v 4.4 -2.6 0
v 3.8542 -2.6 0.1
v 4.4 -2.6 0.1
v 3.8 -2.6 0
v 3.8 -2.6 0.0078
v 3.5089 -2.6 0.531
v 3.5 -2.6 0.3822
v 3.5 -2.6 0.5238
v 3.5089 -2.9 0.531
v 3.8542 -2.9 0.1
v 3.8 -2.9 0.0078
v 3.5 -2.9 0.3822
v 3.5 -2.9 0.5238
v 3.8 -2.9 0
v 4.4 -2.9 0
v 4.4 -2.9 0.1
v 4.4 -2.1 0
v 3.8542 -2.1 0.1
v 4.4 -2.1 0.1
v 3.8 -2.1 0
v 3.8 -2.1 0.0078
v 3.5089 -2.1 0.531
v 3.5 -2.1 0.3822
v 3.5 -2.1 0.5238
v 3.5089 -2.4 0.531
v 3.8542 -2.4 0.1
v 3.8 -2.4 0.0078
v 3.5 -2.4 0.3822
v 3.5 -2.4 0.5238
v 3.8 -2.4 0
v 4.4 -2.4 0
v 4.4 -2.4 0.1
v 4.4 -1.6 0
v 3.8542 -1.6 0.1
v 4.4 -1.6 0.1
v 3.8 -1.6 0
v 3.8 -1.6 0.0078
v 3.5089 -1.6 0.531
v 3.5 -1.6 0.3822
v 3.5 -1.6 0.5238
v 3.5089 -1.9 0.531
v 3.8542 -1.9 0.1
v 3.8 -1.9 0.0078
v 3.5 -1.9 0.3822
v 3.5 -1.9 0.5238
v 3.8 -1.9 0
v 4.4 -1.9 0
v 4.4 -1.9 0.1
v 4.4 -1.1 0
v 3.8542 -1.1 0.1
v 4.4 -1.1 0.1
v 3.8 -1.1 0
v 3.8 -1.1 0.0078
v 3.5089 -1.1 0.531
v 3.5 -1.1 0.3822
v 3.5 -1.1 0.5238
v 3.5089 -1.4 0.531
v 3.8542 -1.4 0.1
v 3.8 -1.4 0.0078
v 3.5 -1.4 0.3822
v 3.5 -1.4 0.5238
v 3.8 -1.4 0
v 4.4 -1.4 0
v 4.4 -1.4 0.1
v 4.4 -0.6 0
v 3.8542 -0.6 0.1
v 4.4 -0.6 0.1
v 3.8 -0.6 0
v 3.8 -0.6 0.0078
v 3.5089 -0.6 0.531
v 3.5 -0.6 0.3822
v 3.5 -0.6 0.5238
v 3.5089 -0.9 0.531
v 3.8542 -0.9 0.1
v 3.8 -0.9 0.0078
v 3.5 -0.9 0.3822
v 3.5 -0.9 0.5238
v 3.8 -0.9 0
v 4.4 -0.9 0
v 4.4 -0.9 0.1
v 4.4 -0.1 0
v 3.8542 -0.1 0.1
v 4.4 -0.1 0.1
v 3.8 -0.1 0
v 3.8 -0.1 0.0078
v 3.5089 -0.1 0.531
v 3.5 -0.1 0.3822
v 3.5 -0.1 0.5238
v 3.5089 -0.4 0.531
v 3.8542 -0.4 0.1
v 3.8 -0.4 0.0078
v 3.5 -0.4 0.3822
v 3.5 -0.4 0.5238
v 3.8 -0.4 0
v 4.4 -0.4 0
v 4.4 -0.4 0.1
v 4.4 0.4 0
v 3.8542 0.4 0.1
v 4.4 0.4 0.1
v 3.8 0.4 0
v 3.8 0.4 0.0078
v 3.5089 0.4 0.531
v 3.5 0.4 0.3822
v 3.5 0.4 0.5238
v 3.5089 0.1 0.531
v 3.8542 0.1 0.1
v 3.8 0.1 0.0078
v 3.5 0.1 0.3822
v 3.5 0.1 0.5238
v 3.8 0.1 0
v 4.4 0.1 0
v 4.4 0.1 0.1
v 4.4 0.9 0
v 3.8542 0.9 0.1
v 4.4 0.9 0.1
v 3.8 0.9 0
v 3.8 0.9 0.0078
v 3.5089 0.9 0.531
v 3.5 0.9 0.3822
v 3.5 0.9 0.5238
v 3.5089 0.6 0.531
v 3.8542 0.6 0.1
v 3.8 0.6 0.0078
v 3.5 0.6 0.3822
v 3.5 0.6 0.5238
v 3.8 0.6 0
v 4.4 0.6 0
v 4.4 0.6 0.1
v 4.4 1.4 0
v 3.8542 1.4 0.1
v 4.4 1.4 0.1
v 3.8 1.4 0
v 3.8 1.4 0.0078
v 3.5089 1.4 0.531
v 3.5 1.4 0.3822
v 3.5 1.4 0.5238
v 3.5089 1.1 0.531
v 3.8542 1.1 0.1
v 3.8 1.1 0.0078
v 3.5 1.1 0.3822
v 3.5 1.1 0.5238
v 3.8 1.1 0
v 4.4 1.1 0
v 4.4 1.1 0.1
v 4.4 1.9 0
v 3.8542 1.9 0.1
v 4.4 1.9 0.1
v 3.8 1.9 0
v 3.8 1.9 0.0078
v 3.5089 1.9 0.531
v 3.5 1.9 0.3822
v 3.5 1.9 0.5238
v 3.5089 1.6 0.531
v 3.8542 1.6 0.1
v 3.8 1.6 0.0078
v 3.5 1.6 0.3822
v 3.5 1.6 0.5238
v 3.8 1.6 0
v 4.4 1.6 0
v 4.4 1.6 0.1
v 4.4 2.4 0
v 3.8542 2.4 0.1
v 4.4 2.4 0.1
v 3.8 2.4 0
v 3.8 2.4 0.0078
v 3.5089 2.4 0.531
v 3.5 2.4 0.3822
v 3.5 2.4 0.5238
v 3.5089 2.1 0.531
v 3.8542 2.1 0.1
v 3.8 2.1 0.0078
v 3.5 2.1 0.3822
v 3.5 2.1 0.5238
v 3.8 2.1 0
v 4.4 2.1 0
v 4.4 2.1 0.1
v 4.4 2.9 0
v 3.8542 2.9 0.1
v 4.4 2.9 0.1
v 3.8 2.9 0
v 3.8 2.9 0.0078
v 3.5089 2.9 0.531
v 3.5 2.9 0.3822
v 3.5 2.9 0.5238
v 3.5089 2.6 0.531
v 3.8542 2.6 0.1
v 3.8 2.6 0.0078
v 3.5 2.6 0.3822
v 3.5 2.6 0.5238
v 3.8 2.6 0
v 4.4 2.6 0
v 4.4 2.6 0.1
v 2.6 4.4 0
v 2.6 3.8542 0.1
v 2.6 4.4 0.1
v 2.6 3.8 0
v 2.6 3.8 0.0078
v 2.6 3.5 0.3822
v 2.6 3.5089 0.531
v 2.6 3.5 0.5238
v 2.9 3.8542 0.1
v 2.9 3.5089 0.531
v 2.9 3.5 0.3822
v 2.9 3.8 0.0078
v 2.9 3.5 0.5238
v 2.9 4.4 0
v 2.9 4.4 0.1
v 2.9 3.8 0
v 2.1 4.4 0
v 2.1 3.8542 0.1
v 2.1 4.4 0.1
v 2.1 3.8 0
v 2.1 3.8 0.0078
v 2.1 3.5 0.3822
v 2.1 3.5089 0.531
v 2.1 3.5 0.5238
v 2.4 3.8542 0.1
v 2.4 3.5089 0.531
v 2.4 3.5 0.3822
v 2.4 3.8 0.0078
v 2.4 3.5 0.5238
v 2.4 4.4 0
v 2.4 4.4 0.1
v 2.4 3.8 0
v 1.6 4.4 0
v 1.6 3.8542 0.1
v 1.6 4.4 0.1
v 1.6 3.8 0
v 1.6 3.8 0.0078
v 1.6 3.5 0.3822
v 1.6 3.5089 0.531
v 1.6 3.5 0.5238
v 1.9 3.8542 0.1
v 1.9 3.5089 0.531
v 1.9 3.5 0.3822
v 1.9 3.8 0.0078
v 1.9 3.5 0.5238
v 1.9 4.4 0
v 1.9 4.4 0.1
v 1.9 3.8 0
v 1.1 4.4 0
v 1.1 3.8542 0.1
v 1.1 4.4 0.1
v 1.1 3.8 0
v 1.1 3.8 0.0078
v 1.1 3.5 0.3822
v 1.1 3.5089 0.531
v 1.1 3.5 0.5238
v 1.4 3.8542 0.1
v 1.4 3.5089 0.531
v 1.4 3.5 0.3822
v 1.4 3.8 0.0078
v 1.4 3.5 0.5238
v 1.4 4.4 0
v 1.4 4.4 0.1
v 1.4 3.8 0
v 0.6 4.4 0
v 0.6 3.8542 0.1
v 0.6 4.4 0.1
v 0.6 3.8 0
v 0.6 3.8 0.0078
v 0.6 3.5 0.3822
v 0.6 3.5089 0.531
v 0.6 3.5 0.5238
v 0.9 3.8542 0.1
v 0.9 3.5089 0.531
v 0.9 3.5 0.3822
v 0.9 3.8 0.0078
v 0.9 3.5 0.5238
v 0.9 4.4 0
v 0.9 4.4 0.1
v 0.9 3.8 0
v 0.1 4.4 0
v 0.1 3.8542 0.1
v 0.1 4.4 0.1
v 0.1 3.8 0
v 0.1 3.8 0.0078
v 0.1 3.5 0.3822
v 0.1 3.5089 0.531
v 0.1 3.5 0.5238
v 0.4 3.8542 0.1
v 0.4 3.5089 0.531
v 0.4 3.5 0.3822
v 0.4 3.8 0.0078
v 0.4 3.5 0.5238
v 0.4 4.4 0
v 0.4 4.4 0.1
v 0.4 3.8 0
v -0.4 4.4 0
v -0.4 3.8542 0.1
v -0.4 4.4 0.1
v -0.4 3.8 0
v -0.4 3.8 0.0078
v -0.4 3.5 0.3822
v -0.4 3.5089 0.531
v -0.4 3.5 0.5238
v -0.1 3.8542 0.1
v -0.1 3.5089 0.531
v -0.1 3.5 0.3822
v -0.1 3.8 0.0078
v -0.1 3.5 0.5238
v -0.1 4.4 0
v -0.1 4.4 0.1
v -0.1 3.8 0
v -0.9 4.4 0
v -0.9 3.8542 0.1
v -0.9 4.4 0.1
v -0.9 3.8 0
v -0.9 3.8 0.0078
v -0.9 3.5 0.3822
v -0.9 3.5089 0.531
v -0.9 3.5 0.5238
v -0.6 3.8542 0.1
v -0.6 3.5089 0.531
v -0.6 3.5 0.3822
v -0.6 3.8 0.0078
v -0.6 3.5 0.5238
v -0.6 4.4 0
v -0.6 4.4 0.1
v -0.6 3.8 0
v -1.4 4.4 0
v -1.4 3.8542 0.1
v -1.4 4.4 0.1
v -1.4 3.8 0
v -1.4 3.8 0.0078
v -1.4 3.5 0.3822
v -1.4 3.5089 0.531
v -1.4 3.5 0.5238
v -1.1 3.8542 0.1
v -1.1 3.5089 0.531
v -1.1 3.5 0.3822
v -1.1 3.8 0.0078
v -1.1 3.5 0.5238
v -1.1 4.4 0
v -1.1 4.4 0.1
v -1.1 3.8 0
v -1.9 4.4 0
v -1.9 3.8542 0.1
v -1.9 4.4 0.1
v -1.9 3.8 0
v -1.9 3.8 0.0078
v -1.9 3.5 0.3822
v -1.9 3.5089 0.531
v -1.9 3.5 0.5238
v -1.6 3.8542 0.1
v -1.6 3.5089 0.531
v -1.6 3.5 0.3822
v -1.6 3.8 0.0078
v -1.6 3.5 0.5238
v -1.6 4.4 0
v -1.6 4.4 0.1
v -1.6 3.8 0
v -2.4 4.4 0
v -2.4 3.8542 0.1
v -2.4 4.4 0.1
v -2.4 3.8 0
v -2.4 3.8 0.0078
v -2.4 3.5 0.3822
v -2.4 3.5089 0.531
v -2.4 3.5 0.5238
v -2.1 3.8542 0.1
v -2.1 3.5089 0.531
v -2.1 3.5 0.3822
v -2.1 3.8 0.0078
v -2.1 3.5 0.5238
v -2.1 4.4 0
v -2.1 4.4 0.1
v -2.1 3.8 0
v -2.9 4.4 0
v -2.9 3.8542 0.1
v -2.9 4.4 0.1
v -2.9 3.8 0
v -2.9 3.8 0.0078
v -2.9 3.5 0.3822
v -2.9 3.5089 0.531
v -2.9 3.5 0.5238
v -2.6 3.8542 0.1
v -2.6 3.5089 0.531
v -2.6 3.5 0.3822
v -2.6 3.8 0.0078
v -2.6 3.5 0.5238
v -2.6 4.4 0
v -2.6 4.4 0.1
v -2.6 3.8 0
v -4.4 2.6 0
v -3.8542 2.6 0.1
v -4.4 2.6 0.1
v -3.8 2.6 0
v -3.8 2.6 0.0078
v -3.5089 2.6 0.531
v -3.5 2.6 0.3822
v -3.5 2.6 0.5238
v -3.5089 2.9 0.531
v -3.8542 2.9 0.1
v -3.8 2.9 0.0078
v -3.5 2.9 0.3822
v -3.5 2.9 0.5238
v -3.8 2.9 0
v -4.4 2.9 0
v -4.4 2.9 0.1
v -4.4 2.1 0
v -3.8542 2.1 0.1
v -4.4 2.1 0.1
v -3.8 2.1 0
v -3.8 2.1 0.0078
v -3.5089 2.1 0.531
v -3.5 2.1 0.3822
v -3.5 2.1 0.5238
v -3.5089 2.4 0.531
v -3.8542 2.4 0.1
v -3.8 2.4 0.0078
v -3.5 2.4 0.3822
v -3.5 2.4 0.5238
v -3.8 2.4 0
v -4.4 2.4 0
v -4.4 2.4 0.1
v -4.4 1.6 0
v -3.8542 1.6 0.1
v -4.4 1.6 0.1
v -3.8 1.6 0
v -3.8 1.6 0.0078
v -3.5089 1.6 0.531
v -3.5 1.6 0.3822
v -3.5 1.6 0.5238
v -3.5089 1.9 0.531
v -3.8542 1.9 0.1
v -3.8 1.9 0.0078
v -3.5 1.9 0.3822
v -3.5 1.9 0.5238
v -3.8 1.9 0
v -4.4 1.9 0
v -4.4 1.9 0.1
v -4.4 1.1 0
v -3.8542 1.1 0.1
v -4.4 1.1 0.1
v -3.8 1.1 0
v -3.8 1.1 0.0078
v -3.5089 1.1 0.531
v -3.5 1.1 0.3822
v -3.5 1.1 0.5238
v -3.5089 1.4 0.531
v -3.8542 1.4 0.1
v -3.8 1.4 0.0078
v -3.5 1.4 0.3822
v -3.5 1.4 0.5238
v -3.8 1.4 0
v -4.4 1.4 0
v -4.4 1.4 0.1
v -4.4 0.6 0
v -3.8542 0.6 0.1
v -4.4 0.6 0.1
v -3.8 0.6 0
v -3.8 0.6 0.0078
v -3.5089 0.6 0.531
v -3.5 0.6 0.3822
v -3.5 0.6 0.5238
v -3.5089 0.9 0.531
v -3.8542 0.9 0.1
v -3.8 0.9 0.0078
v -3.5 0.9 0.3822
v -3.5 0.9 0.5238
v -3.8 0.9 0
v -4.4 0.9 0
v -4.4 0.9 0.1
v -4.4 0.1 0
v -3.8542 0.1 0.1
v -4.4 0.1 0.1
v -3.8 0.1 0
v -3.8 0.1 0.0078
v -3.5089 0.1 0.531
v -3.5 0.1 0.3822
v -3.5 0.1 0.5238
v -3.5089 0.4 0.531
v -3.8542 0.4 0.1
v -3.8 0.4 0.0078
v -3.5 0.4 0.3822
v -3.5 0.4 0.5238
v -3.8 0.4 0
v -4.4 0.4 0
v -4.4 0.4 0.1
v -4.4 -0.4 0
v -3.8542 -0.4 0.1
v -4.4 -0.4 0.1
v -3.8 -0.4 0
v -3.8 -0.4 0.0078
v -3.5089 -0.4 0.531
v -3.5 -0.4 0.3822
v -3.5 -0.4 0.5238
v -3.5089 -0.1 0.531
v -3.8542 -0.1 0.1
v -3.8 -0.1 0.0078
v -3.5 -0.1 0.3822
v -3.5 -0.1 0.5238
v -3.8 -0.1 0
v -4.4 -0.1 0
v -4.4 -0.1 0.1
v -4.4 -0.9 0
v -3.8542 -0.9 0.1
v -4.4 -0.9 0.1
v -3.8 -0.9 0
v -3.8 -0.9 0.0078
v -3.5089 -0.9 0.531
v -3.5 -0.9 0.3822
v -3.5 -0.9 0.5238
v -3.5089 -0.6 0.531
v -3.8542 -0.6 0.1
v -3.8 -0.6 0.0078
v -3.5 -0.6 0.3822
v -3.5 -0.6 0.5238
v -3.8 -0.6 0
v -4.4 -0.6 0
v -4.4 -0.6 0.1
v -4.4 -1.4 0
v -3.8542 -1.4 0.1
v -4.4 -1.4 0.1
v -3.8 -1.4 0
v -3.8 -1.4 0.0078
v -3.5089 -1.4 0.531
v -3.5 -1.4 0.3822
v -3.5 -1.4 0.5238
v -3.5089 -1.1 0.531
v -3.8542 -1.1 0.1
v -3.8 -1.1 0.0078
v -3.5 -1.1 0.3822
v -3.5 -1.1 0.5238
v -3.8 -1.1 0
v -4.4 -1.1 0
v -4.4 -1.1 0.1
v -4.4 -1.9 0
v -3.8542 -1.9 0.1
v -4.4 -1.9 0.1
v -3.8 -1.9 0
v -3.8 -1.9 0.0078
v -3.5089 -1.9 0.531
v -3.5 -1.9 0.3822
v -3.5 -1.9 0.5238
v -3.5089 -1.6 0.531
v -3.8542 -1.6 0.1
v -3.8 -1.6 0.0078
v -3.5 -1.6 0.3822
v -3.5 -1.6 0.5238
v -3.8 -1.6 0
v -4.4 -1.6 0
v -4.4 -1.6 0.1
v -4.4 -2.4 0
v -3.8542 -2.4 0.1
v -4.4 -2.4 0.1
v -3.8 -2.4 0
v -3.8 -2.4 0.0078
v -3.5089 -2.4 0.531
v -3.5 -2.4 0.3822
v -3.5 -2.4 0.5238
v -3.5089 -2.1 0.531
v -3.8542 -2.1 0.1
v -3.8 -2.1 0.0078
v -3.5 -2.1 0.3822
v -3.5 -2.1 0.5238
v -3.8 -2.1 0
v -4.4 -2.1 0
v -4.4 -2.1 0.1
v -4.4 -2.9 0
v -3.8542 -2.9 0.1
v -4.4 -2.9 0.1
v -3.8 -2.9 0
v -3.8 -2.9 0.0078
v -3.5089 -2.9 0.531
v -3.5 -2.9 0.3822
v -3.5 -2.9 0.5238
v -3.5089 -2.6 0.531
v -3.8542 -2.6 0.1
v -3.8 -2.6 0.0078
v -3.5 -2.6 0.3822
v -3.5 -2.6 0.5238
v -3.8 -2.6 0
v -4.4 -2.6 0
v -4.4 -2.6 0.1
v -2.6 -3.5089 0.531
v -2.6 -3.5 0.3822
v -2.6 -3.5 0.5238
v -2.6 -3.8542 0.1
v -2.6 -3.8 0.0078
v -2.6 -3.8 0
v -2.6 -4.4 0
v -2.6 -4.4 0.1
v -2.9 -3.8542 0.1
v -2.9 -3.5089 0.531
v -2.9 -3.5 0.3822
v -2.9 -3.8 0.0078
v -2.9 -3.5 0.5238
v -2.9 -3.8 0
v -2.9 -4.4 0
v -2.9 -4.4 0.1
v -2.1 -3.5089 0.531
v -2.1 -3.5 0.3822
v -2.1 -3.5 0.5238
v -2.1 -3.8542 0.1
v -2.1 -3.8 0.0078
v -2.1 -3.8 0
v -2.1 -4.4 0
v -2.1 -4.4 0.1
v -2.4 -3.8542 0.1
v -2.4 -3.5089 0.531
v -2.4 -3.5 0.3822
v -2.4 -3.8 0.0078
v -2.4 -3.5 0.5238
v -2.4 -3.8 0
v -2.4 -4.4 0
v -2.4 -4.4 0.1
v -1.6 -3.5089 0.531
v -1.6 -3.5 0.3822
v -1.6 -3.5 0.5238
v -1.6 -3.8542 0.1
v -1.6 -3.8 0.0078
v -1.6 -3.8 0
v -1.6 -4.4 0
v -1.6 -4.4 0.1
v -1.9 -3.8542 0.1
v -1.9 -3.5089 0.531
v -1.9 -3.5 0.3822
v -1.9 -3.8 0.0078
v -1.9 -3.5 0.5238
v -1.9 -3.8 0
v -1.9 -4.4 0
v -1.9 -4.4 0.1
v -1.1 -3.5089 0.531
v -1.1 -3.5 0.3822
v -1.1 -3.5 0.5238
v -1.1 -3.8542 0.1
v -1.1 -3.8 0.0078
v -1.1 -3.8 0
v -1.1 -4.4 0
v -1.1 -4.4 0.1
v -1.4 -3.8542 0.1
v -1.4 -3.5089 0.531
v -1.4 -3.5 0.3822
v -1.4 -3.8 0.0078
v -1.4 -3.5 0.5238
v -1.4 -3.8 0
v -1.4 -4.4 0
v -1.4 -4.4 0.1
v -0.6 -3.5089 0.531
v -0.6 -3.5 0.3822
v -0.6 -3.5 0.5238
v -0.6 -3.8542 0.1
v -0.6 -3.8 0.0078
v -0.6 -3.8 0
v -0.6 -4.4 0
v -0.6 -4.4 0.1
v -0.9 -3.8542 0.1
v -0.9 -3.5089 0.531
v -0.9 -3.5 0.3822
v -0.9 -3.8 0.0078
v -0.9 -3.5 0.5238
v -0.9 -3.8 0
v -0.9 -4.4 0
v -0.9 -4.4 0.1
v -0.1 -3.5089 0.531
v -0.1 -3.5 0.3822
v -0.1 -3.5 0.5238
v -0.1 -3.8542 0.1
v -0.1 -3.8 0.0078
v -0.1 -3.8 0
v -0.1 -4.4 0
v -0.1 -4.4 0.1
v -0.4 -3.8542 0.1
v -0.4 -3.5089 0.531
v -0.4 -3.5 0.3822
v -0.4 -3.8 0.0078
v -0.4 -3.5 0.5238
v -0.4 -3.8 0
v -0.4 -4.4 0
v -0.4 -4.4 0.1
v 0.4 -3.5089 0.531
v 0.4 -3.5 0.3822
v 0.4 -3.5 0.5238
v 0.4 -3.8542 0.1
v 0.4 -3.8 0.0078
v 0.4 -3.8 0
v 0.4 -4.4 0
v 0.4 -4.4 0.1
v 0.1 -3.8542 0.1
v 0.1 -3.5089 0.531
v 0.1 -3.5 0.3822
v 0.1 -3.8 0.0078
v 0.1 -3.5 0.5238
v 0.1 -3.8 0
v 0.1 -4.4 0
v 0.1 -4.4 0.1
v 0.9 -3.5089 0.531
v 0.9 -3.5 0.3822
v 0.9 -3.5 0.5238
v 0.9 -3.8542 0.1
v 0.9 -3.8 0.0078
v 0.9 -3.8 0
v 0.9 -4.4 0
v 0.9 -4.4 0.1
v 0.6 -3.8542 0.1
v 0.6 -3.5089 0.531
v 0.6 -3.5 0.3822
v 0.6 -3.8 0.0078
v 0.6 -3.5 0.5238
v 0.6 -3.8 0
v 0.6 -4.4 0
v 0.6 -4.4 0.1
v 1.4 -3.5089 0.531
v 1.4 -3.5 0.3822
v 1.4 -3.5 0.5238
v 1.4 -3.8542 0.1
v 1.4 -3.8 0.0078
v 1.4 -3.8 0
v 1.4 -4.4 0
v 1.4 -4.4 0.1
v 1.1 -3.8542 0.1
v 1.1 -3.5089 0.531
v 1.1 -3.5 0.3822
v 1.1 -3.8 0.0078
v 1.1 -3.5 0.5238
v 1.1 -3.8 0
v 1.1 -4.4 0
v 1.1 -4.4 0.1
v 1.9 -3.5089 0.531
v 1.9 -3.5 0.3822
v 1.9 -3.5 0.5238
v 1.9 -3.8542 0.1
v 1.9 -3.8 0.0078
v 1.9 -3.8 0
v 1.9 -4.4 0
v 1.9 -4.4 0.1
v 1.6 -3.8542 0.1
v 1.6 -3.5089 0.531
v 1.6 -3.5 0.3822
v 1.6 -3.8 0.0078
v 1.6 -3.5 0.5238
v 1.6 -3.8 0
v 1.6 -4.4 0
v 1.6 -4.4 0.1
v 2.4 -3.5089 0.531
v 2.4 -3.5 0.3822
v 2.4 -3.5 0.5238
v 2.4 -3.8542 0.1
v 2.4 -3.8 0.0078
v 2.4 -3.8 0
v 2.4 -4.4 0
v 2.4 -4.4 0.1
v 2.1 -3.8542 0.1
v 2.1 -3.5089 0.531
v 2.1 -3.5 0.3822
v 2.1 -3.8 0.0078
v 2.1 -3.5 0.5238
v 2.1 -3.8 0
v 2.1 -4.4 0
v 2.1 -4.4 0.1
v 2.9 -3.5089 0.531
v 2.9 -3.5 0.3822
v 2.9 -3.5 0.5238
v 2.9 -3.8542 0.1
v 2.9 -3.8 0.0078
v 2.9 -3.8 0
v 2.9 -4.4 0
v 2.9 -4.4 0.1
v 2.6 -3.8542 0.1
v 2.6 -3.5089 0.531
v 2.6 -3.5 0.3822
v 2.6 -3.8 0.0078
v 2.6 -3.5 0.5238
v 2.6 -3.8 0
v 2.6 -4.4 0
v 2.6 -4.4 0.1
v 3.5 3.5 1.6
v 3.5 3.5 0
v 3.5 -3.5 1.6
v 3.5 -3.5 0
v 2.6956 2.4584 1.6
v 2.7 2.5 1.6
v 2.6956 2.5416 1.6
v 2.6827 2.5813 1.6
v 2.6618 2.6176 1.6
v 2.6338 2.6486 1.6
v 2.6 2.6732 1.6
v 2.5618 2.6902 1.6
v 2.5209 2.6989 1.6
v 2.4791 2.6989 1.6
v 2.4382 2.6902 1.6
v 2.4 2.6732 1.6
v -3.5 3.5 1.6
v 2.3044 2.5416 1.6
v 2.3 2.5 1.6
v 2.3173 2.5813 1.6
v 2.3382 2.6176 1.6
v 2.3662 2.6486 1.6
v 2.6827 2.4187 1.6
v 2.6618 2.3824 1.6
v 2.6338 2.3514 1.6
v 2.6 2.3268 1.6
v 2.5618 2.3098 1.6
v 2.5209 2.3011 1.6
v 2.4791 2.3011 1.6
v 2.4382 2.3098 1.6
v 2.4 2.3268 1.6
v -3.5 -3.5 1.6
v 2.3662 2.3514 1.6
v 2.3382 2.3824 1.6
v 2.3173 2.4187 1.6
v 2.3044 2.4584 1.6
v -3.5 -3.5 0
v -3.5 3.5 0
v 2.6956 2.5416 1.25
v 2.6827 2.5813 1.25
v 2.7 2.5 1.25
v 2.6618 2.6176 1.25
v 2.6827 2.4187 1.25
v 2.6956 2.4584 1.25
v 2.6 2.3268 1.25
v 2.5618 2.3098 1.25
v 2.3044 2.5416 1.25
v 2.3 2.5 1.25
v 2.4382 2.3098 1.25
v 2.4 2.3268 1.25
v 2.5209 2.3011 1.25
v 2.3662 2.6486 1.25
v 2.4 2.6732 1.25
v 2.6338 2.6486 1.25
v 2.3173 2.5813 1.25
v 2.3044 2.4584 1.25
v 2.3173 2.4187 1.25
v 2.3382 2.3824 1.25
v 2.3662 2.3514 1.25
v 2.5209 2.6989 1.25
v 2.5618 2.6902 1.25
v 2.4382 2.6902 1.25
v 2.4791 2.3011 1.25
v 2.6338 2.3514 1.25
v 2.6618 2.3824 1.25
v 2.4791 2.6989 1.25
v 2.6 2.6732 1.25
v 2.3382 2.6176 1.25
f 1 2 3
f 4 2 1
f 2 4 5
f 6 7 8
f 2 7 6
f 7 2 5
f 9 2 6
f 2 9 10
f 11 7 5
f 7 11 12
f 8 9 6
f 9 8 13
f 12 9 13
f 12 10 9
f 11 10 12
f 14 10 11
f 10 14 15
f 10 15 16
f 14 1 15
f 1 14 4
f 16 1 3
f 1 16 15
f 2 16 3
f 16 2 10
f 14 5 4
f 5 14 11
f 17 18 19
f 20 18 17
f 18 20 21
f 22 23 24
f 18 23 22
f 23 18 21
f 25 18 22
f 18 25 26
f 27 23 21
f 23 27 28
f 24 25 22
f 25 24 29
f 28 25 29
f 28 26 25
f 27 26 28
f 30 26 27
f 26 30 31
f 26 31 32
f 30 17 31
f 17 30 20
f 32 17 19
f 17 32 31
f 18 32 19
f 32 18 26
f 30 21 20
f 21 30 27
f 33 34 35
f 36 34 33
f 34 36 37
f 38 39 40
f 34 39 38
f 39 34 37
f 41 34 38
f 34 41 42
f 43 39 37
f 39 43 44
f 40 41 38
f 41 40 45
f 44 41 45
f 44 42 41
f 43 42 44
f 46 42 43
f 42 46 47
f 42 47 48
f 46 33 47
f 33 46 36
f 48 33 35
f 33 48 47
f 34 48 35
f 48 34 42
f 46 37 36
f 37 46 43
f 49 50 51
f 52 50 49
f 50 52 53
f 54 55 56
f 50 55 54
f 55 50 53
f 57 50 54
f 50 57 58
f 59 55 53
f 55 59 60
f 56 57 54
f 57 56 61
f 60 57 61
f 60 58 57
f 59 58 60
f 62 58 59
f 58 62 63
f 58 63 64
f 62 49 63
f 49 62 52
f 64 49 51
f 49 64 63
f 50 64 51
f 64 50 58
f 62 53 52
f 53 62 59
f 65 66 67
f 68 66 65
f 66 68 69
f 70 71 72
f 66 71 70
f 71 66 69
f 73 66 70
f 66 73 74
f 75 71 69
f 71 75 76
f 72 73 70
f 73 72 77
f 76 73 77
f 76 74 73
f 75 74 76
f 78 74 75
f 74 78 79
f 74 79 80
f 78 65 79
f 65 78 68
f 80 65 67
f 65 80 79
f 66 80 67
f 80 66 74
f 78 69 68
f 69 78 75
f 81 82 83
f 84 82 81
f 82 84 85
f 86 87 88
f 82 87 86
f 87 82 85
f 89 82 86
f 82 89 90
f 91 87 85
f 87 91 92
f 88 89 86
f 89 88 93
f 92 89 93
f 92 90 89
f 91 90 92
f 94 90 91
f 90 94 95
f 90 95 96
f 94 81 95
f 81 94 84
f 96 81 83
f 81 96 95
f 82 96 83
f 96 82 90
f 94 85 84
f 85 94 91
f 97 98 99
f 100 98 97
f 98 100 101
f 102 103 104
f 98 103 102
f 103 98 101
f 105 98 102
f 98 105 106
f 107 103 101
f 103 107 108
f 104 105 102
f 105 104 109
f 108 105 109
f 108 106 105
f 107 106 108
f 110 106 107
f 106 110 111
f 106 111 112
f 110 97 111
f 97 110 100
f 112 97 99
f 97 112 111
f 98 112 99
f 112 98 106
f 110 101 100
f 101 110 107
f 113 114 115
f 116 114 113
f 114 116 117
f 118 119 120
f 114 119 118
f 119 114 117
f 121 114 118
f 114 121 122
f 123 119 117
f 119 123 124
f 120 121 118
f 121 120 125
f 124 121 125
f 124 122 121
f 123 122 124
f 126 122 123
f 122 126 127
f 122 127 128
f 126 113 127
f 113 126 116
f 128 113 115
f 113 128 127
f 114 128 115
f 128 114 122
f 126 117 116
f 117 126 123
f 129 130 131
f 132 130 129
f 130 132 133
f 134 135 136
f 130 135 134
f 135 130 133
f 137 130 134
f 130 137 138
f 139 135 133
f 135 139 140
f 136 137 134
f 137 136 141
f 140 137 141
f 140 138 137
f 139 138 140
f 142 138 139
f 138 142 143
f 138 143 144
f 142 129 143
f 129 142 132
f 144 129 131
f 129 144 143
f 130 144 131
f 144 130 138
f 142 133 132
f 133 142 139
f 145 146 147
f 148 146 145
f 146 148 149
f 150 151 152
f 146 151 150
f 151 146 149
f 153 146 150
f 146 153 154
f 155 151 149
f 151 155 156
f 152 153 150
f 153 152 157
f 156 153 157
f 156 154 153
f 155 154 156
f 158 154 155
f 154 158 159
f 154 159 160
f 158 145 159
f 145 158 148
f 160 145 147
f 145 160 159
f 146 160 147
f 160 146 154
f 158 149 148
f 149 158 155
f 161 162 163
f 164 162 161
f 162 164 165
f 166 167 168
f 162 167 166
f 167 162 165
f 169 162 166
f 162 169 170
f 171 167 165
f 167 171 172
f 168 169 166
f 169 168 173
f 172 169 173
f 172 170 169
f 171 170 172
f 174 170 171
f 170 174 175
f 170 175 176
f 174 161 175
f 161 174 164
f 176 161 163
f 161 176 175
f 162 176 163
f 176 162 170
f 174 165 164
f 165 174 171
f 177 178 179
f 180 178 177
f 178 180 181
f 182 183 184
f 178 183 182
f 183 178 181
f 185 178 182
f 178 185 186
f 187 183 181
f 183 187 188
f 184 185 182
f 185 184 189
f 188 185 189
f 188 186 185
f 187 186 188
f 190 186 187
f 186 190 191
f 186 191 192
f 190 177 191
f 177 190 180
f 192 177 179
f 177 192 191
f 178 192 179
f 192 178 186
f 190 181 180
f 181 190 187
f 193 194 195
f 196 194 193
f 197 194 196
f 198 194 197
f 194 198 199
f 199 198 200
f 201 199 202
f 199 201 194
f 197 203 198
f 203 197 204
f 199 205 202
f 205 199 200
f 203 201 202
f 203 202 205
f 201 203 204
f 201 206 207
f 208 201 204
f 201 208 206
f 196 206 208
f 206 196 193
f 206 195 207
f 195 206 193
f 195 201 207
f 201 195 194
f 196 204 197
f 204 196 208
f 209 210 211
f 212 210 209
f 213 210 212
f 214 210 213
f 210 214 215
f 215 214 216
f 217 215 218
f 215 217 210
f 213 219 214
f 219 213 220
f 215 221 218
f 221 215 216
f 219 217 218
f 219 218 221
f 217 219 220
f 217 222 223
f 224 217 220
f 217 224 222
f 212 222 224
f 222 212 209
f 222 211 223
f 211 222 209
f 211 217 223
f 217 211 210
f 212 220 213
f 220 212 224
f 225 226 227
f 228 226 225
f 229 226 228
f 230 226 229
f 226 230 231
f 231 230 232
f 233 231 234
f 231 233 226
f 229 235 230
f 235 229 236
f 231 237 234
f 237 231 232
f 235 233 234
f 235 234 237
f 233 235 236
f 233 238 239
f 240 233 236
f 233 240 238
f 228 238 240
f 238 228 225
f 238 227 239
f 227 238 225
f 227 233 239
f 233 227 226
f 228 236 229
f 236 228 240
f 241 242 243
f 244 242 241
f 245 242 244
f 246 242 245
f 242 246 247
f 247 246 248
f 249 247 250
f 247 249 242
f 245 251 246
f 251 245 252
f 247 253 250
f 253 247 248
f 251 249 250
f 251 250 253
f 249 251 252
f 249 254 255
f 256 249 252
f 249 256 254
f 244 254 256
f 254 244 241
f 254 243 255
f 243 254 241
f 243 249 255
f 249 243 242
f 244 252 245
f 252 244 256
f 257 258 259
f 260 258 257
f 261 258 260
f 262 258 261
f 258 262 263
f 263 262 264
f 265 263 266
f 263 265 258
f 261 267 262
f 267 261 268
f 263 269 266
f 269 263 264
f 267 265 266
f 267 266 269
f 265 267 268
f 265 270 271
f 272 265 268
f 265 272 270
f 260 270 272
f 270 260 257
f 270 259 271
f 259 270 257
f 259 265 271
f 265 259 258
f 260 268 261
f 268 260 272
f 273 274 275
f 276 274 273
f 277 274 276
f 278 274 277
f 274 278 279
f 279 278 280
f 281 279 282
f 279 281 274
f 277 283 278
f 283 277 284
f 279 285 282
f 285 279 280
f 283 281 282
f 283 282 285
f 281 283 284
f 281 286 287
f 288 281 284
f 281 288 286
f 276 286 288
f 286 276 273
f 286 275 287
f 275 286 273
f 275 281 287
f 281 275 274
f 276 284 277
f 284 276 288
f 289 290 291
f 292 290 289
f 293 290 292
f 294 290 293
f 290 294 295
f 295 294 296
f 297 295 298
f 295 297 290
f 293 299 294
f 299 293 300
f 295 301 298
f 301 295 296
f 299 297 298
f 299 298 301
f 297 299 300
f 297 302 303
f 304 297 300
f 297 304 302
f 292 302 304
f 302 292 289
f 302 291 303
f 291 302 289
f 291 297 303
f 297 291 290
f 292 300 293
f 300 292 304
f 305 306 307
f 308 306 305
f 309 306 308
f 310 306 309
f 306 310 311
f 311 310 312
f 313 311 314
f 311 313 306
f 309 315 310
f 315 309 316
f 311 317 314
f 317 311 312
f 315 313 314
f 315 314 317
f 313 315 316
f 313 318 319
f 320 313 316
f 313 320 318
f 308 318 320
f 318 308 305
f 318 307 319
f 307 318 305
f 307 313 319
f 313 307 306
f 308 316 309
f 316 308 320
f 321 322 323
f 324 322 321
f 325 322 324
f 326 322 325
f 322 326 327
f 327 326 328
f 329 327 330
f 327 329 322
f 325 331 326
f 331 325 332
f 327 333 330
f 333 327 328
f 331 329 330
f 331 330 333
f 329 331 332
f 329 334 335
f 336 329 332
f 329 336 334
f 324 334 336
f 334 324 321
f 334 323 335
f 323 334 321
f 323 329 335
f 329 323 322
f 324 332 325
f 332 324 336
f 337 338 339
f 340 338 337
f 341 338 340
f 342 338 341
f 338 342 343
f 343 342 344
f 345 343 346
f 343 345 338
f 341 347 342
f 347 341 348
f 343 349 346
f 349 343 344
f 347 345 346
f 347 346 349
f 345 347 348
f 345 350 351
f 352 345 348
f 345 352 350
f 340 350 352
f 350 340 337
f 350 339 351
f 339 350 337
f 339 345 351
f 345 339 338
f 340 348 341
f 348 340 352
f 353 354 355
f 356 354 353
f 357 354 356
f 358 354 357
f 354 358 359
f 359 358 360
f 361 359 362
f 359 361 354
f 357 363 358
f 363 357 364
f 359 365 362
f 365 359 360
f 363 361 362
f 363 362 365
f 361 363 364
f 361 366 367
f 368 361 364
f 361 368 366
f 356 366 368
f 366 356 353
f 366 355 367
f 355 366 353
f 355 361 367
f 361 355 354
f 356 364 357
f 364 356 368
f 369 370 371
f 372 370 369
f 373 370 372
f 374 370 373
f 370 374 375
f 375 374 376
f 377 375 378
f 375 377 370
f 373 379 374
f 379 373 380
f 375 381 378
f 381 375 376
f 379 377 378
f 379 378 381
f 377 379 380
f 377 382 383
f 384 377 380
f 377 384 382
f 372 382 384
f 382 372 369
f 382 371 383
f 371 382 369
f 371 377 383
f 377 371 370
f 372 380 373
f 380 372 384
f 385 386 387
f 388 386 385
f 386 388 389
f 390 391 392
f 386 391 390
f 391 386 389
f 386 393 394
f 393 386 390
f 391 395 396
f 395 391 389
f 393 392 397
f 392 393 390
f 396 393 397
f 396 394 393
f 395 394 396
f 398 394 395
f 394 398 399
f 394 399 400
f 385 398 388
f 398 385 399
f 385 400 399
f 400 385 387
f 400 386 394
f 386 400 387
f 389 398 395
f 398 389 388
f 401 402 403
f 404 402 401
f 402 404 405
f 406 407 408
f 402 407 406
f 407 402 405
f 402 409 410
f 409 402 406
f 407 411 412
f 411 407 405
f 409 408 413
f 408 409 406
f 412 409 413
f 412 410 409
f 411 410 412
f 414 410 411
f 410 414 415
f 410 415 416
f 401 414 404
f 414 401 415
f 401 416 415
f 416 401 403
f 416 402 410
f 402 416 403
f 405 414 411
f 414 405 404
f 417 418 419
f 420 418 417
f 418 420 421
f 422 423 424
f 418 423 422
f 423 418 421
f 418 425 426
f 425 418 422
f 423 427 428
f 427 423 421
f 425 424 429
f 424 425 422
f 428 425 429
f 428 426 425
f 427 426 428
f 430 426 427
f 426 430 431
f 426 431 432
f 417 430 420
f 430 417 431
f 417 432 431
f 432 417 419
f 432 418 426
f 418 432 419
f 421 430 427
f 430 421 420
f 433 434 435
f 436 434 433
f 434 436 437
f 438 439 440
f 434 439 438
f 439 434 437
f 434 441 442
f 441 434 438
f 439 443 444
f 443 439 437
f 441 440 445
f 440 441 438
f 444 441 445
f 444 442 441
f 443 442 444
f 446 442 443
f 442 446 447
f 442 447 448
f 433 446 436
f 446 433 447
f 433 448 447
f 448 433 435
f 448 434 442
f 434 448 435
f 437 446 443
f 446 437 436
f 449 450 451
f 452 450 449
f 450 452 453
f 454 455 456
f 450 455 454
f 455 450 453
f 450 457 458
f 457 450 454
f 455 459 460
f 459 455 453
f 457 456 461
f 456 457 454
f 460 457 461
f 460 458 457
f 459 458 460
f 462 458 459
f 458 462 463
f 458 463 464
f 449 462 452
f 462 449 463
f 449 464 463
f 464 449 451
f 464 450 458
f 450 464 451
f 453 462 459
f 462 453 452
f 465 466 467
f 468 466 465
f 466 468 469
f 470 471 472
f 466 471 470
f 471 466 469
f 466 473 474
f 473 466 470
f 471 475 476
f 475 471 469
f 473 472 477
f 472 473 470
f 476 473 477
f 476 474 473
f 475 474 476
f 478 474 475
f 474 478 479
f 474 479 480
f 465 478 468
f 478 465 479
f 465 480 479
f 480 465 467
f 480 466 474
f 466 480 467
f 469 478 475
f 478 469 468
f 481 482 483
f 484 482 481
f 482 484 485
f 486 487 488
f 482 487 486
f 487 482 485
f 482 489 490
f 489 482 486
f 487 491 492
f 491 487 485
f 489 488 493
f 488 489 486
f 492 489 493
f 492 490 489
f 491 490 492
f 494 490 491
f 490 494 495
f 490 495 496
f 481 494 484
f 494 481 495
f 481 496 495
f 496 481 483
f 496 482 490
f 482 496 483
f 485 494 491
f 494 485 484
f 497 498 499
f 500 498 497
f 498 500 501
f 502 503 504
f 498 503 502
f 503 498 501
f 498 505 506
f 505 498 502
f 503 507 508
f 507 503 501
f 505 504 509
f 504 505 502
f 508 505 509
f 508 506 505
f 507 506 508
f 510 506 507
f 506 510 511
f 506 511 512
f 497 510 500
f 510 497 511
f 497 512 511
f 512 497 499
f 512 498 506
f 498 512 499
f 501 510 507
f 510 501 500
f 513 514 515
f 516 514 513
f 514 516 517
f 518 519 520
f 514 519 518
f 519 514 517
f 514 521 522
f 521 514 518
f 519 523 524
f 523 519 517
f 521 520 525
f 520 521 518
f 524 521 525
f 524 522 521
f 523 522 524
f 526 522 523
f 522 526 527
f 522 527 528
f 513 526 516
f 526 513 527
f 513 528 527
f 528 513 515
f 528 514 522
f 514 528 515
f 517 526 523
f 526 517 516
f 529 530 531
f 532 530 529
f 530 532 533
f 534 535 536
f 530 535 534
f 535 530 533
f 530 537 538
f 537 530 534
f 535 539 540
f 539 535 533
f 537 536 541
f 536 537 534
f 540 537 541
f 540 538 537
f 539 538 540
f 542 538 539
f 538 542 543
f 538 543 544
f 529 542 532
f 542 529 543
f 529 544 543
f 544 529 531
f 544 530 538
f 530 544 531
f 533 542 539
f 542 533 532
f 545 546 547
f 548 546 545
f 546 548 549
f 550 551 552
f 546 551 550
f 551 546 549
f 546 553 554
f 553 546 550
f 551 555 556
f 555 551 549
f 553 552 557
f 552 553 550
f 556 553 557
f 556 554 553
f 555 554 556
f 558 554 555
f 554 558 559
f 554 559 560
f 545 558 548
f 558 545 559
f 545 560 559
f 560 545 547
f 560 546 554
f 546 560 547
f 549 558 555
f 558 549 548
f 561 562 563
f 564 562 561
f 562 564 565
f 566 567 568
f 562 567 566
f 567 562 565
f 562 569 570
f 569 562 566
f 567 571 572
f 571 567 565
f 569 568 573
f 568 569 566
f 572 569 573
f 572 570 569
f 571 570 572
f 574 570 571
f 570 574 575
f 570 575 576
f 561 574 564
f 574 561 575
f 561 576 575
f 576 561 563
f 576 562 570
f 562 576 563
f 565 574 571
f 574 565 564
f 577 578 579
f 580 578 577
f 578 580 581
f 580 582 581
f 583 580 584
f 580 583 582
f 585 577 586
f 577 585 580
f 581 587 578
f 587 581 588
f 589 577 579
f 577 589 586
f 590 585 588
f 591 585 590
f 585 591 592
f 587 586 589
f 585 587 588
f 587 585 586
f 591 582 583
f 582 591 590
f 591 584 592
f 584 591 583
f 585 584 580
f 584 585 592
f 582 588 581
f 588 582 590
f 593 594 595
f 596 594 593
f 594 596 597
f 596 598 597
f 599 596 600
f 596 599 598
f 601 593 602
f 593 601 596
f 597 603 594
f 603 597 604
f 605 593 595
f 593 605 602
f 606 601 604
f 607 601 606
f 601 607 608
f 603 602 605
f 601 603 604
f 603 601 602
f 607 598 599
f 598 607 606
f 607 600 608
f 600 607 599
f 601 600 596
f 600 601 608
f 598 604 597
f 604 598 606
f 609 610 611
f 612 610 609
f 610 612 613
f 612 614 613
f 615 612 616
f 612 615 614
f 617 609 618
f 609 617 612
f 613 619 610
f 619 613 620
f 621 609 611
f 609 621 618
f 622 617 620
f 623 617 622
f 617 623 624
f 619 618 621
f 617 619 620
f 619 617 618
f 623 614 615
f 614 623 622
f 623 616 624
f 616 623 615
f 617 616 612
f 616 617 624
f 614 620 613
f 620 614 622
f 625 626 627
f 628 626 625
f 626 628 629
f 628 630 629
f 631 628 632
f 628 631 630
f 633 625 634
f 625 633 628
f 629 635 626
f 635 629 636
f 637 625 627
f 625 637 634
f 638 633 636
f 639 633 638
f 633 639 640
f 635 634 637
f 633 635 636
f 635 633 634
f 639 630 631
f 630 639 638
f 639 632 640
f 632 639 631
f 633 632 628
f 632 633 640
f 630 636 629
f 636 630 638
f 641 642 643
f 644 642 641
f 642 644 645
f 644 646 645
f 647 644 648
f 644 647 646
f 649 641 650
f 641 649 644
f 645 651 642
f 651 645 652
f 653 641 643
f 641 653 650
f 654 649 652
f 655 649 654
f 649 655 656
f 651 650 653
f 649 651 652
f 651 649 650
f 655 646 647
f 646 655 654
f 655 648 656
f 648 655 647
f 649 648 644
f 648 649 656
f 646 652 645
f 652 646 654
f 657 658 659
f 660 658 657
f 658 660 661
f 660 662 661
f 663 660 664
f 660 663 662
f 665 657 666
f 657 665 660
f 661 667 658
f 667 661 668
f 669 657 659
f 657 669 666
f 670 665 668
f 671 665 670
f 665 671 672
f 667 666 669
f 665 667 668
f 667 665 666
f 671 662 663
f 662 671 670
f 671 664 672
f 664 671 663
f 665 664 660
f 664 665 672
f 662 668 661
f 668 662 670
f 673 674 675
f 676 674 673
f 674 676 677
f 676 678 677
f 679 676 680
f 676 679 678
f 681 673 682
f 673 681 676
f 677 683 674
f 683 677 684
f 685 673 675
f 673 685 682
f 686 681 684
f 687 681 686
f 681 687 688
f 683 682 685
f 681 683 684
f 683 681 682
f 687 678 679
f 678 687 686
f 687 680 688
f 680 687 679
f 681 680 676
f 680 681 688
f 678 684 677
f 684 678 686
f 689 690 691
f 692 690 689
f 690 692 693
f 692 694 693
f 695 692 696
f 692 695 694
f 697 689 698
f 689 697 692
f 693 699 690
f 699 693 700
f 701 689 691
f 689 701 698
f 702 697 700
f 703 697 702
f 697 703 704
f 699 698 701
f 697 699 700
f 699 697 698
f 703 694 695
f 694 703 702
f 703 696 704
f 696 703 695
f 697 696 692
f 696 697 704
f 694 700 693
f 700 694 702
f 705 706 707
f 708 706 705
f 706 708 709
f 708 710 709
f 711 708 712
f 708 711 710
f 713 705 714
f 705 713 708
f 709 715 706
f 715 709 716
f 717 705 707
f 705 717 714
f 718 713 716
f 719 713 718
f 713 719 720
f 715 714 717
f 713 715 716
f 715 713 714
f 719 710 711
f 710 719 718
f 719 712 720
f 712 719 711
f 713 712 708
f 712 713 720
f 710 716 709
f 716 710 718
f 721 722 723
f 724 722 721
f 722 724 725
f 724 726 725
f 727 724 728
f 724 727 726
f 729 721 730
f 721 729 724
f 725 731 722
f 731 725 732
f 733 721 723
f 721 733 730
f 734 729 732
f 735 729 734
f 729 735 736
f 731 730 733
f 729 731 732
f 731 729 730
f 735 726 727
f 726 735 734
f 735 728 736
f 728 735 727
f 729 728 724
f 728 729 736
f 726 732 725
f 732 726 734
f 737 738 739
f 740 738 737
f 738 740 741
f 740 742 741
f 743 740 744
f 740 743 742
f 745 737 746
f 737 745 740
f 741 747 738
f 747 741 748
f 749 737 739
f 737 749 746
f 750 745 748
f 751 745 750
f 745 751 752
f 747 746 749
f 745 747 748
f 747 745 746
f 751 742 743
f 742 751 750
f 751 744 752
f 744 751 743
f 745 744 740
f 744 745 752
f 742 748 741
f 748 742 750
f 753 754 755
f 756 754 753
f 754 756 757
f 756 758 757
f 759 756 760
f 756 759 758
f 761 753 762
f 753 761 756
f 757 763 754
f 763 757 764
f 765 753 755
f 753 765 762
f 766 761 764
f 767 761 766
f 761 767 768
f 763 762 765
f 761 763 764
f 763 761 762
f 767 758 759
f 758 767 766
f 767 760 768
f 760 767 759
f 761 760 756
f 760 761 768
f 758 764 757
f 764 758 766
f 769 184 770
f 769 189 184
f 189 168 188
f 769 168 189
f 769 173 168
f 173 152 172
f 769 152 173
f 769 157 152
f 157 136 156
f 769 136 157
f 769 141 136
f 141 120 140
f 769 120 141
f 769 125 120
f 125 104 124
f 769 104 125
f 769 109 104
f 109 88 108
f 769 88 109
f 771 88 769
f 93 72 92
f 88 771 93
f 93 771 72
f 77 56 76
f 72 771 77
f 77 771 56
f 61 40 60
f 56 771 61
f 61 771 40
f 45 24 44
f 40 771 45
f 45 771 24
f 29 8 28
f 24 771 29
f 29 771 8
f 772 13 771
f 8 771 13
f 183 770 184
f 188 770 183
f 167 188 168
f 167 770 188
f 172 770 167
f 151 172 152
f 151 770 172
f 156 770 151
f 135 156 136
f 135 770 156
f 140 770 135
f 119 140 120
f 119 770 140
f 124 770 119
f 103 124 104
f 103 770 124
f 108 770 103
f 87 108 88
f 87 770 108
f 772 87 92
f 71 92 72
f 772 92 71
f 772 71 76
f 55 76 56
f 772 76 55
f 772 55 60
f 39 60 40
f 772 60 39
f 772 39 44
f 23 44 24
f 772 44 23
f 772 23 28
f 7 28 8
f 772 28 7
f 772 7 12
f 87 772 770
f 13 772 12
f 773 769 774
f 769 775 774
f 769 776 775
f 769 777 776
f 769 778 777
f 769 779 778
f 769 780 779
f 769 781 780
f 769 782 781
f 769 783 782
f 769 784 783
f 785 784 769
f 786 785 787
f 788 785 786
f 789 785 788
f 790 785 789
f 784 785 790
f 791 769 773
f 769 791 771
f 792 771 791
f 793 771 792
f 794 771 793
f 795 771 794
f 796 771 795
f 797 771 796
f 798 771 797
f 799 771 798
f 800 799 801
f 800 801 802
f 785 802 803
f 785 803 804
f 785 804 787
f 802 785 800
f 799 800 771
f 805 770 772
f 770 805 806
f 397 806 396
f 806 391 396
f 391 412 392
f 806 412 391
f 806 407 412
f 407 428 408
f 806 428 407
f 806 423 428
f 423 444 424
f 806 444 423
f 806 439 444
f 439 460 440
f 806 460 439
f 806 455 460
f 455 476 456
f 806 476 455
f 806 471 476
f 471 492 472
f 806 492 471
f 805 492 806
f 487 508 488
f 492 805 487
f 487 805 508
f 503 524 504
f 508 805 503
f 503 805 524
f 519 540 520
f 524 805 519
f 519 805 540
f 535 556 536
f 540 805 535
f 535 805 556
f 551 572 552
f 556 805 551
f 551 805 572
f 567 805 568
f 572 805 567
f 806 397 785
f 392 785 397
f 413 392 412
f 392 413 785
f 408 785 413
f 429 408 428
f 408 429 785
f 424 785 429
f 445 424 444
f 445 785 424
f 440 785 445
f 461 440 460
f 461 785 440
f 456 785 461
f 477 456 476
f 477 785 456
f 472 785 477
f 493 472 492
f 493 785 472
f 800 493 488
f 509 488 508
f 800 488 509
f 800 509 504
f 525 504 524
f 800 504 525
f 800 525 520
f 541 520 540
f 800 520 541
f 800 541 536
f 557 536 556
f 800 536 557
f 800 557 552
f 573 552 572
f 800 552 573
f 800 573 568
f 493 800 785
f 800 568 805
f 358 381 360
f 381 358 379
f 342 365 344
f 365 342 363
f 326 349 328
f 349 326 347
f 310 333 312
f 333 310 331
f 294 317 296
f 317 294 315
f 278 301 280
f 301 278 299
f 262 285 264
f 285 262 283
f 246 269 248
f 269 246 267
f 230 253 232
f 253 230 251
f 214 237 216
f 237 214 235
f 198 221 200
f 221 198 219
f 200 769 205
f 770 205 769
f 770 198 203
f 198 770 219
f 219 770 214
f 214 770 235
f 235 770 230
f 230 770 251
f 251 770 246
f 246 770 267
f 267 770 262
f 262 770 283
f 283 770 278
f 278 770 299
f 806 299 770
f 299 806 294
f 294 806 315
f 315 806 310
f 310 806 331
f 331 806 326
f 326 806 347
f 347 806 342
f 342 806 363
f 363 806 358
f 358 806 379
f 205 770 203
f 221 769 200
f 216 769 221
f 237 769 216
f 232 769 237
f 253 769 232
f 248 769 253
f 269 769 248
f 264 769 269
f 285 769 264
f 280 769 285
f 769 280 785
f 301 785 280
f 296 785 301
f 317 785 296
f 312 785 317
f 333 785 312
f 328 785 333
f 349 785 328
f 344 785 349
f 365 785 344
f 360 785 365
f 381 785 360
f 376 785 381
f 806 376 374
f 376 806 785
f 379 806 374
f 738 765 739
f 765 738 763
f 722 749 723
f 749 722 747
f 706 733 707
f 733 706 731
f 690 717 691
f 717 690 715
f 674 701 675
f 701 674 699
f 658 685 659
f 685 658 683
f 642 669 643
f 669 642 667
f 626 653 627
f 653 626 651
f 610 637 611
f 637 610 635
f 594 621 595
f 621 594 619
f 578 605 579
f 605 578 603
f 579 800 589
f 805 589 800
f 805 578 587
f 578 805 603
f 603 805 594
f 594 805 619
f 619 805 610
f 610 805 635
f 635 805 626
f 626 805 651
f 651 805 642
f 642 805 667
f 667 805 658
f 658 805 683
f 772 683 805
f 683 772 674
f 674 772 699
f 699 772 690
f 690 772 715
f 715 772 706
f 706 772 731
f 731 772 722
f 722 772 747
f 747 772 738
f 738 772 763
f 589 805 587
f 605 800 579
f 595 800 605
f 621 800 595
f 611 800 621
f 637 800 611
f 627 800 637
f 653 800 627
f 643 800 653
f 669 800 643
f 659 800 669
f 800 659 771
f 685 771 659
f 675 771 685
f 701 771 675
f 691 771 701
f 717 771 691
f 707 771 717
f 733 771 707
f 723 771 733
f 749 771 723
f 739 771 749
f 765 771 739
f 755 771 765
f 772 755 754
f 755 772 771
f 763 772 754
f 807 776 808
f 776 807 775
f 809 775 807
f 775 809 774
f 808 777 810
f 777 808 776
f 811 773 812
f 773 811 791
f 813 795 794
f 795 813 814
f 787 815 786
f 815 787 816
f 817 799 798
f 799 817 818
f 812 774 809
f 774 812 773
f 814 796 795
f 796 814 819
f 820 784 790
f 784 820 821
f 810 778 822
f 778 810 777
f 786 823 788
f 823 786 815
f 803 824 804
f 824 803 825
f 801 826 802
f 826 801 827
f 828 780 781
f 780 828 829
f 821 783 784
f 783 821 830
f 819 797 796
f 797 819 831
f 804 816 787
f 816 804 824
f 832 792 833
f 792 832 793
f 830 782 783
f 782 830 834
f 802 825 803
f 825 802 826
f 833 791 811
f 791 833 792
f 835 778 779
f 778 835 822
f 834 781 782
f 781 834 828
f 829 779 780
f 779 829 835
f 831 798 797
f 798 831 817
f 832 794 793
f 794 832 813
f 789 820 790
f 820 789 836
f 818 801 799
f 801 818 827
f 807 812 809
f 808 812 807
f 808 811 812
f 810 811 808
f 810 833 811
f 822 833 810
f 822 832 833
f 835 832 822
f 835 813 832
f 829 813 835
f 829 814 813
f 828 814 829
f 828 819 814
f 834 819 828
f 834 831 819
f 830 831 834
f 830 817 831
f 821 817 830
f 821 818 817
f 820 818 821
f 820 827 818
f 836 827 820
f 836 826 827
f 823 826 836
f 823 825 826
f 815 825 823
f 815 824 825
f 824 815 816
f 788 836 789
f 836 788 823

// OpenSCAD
// All dimensions in mm
module pin() {
	translate(v = [.60,0,.1/2]) cube(size=[.6,.3,.1], center=true);
	difference() {
	translate(v=[.4/2 -.03,0,.5/2]) rotate(a = 51.3, v= [0,1,0]) cube(size=[.64,.3,.1], center=true);
	
	translate(v=[0,0,-10]) cube(size = 20, center = true);
	}
}

module side_of_pins() {
	translate(v=[0,-.5*6+.25,0]) {
		for (z = [0:11]) {
			translate(v=[7/2,(z*.5),0]) pin();
		}
	}
}

side_of_pins();
rotate(a=90, v=[0,0,1])side_of_pins();
rotate(a=180, v=[0,0,1])side_of_pins();
rotate(a=270, v=[0,0,1])side_of_pins();


h = 1.6;
difference() {
// Form main body of LQFP48 package
translate(v=[0,0,h/2]) cube(size=[7,7,h],center = true);

translate(v = [7/2-1,7/2-1, 6.25]) cylinder(r = .2, h = 10, center = true, $fs=.01);
}
